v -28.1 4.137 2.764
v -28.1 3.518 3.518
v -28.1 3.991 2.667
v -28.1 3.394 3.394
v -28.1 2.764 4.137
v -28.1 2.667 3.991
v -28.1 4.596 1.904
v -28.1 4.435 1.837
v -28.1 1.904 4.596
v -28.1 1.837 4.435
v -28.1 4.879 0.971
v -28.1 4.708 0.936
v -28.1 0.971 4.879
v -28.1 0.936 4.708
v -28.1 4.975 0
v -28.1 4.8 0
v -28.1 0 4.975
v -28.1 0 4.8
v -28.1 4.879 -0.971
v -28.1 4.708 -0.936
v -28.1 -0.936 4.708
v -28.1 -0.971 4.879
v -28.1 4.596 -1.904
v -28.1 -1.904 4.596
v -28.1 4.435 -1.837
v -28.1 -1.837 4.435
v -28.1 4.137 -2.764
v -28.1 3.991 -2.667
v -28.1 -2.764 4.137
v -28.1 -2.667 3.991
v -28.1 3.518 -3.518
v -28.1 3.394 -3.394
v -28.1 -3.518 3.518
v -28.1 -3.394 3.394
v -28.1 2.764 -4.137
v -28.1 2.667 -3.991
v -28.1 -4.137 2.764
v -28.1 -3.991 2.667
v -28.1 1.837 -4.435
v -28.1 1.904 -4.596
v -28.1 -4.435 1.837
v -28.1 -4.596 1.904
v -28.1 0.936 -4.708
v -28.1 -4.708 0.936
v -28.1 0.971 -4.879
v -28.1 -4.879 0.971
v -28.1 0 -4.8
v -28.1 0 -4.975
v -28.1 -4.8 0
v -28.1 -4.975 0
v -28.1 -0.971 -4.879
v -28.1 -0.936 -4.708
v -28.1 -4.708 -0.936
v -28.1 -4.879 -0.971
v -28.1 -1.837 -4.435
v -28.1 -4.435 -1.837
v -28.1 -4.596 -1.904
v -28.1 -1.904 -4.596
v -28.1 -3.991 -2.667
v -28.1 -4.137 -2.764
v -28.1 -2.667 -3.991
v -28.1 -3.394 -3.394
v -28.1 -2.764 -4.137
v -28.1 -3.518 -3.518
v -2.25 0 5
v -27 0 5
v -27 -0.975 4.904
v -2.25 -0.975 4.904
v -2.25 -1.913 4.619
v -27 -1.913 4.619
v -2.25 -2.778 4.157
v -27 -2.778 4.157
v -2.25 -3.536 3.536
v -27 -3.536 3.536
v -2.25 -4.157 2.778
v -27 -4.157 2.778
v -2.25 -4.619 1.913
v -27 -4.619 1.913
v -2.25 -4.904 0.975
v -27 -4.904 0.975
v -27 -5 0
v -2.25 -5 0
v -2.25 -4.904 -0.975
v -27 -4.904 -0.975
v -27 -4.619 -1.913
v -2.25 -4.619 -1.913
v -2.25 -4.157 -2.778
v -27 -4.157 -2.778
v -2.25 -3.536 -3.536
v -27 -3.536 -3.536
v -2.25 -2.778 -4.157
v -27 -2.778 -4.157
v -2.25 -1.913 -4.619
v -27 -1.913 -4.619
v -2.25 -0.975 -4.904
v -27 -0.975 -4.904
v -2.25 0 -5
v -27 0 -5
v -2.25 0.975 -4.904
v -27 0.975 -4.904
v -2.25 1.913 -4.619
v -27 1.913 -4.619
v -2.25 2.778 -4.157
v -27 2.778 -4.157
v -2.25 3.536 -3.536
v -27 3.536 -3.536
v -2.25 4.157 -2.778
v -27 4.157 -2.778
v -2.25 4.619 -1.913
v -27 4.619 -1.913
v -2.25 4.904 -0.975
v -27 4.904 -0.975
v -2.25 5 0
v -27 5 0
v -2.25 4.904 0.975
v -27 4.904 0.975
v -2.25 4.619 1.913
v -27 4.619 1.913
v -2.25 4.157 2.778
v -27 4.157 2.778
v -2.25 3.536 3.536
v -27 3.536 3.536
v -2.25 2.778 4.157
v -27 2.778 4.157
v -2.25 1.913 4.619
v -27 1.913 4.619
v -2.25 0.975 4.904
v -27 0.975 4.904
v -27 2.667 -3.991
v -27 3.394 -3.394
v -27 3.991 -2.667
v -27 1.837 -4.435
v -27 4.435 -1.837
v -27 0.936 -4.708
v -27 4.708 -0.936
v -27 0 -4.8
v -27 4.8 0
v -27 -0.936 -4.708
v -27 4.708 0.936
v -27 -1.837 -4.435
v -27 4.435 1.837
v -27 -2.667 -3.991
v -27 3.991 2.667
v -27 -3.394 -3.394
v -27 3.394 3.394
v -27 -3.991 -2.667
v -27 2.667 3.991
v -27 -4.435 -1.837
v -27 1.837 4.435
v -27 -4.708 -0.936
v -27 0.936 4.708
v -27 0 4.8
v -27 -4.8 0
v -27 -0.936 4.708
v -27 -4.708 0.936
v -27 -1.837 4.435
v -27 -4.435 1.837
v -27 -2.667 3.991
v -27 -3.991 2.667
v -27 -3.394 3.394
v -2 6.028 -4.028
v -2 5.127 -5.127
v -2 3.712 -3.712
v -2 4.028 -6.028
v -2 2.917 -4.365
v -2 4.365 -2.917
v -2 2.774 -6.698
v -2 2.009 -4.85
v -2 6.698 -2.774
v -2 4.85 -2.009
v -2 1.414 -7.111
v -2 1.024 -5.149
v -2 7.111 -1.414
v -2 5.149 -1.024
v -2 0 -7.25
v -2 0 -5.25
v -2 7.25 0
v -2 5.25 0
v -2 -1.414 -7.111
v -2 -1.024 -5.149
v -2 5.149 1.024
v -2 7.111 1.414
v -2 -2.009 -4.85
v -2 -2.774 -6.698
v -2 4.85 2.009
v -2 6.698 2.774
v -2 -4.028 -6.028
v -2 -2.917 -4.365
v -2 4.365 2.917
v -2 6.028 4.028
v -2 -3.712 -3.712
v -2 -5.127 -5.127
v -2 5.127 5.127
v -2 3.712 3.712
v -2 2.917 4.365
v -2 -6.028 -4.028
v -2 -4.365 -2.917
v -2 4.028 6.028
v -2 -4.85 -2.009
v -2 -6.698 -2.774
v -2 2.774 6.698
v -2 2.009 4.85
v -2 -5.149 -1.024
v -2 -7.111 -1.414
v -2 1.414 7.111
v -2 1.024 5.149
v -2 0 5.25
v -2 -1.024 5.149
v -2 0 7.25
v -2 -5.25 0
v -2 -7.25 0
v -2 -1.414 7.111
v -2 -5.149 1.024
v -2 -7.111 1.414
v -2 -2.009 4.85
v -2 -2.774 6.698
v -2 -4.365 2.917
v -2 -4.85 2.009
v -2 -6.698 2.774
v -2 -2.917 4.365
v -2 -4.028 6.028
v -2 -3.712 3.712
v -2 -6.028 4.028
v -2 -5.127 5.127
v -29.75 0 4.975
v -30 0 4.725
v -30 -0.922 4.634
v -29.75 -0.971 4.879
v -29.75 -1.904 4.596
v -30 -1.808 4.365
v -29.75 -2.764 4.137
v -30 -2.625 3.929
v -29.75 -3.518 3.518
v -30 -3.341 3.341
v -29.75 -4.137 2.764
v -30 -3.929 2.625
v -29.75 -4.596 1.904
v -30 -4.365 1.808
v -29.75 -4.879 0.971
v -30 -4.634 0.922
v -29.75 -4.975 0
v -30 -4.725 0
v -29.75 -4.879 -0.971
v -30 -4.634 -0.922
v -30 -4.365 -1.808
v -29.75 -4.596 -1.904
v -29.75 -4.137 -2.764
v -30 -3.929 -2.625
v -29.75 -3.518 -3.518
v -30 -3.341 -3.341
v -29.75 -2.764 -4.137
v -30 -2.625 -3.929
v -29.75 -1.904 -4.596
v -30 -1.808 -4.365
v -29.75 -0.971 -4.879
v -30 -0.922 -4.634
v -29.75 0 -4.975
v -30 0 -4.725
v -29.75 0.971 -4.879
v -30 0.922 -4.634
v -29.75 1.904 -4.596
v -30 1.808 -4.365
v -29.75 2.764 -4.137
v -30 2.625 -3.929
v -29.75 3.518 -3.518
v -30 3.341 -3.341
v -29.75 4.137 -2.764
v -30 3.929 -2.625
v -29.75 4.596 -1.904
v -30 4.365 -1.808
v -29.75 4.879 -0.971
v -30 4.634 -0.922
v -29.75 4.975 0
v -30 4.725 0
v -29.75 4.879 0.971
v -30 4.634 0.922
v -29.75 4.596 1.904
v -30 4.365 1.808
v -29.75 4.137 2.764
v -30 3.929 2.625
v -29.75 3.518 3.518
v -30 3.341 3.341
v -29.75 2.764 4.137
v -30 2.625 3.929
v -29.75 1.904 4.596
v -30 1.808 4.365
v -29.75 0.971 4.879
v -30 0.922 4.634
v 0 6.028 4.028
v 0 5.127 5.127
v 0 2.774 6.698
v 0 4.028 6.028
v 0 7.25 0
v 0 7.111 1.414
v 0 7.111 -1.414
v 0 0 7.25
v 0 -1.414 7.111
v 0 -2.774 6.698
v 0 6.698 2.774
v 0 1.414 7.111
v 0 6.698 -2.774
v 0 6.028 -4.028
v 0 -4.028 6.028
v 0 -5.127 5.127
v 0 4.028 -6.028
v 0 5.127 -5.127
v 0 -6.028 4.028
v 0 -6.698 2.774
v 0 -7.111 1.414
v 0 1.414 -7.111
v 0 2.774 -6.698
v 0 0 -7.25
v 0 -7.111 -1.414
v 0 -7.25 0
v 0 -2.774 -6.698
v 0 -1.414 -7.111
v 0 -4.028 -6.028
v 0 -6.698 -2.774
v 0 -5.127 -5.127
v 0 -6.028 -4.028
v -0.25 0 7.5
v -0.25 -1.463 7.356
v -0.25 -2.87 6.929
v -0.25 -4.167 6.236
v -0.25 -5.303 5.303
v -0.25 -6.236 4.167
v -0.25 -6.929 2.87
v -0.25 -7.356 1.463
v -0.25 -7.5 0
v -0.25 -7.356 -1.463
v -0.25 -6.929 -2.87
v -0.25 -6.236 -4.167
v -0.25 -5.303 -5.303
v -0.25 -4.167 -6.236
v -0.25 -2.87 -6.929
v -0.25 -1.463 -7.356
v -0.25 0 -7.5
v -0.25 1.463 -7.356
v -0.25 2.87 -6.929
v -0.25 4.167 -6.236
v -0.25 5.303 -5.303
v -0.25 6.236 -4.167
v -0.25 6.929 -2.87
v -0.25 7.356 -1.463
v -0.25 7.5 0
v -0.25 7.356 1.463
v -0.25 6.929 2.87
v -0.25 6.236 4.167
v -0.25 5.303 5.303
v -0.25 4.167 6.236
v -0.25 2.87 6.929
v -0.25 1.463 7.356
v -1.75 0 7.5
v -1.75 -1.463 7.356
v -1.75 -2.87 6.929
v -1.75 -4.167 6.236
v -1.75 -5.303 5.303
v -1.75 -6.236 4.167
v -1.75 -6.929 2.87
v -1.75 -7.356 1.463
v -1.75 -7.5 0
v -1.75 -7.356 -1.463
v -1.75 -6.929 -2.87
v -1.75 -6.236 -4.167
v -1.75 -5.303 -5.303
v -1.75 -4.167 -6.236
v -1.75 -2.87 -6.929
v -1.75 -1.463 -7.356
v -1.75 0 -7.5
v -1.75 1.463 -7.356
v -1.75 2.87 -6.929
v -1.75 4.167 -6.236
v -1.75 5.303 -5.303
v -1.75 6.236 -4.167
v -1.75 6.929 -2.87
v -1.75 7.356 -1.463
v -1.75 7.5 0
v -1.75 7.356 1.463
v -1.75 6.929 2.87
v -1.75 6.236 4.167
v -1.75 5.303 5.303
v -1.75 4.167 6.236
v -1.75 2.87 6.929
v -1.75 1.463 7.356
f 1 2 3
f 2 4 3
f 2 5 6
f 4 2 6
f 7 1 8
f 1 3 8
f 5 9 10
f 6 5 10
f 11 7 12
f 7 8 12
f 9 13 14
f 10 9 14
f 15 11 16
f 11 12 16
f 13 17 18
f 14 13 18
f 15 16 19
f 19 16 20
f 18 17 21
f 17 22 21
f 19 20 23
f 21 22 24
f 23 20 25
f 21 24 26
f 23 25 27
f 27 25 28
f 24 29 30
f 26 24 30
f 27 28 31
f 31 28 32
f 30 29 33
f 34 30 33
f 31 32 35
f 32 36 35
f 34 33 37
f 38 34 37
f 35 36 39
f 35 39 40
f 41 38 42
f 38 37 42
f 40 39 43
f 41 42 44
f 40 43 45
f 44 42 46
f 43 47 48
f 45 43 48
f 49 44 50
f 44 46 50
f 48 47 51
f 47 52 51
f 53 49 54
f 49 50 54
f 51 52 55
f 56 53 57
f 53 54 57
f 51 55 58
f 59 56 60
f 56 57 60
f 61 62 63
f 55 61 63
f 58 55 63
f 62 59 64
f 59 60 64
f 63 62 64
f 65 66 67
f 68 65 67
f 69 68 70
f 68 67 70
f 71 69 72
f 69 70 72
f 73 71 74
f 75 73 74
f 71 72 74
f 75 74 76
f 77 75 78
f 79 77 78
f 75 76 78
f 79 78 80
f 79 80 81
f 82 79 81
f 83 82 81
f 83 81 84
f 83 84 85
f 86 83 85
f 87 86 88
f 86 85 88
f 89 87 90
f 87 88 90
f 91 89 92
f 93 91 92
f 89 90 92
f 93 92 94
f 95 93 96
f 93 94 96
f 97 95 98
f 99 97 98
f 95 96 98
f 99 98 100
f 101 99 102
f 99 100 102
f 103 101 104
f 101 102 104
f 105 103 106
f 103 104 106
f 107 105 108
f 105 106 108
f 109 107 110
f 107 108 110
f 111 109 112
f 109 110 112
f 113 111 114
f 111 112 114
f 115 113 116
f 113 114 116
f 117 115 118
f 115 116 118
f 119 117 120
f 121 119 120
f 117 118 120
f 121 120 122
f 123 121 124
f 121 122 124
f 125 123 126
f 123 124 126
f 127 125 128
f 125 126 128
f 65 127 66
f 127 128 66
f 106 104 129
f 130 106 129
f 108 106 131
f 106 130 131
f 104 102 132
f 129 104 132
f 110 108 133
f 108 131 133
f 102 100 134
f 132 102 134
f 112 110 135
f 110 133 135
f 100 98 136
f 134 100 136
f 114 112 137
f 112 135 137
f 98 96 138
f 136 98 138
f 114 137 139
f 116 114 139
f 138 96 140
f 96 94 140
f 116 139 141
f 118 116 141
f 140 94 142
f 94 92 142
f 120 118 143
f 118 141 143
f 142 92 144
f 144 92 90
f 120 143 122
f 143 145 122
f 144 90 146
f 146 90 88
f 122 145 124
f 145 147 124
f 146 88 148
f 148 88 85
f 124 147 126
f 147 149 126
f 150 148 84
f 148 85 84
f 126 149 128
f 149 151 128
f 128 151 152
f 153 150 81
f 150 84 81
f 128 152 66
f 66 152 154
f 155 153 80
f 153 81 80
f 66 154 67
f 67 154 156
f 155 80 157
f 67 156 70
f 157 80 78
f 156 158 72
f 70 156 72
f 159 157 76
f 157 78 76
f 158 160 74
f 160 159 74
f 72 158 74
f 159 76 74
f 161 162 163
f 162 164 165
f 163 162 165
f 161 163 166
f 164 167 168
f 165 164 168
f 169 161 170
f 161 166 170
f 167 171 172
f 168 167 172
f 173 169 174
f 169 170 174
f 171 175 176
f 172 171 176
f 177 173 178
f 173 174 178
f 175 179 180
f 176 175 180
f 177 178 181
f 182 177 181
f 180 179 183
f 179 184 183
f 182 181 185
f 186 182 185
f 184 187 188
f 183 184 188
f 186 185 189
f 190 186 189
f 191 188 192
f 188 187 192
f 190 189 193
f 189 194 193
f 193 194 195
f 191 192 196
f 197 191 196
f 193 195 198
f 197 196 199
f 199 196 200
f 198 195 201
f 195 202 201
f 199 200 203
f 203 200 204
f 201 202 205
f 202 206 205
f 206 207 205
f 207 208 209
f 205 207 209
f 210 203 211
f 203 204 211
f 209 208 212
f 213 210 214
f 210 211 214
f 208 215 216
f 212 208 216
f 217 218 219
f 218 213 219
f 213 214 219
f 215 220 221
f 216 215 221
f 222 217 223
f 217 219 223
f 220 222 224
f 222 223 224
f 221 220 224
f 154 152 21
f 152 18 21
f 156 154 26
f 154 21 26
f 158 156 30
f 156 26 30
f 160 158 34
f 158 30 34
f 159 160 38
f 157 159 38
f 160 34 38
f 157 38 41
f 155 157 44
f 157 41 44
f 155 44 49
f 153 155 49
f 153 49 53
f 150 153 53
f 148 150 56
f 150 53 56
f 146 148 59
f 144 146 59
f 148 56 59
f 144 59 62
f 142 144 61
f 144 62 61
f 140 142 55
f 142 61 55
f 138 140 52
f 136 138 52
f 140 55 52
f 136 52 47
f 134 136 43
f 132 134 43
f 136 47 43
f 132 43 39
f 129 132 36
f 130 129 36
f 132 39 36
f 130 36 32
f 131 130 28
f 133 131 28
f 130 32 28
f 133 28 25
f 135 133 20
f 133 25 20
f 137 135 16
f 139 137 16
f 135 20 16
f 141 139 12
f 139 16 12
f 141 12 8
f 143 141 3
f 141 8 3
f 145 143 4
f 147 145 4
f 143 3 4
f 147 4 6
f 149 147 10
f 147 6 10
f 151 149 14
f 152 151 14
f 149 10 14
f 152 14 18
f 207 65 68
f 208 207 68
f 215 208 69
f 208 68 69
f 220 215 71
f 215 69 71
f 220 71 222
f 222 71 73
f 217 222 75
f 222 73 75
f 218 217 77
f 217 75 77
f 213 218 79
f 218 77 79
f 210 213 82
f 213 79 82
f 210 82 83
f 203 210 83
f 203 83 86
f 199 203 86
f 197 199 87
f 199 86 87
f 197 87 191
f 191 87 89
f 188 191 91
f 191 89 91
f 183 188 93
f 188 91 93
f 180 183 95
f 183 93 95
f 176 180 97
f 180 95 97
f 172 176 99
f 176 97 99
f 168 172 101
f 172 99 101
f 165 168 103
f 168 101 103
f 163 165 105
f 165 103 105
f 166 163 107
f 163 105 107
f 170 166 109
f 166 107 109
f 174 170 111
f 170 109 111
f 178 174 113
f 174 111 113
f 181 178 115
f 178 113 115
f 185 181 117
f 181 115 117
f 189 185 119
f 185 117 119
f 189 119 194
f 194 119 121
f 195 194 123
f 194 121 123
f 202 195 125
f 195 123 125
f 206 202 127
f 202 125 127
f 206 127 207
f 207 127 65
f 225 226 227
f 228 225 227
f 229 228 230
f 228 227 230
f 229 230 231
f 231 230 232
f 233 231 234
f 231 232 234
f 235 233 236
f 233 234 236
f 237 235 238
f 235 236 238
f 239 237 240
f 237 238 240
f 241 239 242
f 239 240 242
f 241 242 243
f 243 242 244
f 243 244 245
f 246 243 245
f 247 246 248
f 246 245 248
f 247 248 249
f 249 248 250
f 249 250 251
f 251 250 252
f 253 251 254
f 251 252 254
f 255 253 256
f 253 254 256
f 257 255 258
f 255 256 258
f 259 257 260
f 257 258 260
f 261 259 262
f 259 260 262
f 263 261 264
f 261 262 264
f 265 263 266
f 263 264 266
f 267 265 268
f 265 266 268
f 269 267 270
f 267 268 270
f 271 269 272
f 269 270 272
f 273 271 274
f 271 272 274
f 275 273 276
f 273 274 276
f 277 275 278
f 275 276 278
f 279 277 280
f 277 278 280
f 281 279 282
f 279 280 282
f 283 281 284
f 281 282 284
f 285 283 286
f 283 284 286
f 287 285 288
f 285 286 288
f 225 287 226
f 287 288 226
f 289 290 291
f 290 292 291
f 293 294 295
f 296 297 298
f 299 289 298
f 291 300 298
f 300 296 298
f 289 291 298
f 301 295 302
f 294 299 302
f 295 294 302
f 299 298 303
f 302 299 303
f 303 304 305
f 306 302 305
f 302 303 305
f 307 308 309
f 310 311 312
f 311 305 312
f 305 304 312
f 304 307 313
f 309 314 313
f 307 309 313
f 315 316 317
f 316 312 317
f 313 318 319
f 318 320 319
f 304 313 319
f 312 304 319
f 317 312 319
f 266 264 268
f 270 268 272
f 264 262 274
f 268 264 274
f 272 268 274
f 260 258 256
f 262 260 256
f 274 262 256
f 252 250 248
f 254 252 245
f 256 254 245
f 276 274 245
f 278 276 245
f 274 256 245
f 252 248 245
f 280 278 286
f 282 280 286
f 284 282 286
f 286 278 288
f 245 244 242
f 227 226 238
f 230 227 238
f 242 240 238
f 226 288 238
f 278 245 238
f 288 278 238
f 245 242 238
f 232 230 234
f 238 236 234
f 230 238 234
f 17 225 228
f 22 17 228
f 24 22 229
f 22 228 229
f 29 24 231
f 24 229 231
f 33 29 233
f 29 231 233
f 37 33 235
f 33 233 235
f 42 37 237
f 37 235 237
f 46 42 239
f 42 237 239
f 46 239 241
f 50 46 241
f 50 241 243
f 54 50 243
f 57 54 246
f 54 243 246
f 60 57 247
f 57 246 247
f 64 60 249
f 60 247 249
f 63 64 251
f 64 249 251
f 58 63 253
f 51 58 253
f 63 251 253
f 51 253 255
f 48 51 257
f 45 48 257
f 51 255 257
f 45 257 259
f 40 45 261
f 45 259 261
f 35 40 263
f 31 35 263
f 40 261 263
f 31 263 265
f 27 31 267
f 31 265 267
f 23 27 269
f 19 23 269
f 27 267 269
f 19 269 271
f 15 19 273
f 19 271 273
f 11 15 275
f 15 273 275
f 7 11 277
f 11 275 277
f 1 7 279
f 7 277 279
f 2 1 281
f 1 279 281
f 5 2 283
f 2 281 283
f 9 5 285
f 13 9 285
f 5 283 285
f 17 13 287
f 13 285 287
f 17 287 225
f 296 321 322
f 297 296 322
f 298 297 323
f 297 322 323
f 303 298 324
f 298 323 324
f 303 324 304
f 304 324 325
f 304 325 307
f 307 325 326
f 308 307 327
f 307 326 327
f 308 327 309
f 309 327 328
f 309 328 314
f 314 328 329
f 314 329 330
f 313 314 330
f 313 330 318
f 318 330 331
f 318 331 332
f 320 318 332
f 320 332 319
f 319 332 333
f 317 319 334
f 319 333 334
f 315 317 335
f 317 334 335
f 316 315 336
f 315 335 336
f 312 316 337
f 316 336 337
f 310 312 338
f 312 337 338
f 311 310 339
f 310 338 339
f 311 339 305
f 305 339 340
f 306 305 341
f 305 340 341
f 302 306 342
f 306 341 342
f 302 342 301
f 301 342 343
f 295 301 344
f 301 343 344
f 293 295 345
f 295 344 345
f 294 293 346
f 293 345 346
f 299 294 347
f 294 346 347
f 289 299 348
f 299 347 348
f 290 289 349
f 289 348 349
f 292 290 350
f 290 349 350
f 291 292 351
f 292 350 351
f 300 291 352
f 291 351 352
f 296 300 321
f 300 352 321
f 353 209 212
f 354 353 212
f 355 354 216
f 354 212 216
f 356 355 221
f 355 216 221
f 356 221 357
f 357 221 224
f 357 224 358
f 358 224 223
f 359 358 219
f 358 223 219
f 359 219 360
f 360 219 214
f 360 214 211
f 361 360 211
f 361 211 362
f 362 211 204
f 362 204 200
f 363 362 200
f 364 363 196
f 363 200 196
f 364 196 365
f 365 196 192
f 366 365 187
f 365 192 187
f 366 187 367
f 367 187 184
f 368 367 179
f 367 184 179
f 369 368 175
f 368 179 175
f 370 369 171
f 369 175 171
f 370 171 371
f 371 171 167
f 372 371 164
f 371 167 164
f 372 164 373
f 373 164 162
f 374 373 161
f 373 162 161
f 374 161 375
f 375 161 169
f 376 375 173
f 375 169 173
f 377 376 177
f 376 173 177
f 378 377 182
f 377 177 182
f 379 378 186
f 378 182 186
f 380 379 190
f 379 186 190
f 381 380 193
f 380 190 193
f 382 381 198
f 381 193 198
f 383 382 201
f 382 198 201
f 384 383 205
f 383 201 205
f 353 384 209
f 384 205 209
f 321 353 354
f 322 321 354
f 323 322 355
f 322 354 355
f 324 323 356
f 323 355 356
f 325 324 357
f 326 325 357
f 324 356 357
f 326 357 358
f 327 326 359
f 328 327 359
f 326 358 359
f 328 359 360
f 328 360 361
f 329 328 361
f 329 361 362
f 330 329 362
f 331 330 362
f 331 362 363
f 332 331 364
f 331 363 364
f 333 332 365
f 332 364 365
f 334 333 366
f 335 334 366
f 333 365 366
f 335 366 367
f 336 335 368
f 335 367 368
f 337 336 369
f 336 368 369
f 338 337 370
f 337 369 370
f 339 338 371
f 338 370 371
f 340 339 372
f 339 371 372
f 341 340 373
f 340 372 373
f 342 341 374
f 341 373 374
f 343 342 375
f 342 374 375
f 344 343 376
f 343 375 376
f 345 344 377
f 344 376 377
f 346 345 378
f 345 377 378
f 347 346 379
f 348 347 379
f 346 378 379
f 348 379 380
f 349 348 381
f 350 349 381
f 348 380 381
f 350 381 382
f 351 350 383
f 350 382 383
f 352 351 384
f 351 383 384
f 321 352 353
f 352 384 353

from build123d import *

# Parameters (mm, degrees)
F2_SIZE = 0.25


with BuildPart() as f1:
    # F0 (on Front) → F1 (revolve)
    with BuildSketch(Plane.XZ):
        Polygon((-30, 0), (0, 0), (0, 7.5), (-2, 7.5), (-2, 5), (-27, 5), (-27, 4.8), (-28.1, 4.8), (-28.1, 4.975), (-30, 4.975), align=None)
    revolve(axis=Axis((2.79349, 0, 0), (1, 0, 0)))

    # F2
    f2_edges = [f1.edges().sort_by_distance(p)[0] for p in [
        (-2, 0, -7.5),
        (-2, 0, -5),
        (0, 0, -7.5),
        (-30, 0, -4.975),
    ]]
    chamfer(f2_edges, length=F2_SIZE)


solid = f1.part
